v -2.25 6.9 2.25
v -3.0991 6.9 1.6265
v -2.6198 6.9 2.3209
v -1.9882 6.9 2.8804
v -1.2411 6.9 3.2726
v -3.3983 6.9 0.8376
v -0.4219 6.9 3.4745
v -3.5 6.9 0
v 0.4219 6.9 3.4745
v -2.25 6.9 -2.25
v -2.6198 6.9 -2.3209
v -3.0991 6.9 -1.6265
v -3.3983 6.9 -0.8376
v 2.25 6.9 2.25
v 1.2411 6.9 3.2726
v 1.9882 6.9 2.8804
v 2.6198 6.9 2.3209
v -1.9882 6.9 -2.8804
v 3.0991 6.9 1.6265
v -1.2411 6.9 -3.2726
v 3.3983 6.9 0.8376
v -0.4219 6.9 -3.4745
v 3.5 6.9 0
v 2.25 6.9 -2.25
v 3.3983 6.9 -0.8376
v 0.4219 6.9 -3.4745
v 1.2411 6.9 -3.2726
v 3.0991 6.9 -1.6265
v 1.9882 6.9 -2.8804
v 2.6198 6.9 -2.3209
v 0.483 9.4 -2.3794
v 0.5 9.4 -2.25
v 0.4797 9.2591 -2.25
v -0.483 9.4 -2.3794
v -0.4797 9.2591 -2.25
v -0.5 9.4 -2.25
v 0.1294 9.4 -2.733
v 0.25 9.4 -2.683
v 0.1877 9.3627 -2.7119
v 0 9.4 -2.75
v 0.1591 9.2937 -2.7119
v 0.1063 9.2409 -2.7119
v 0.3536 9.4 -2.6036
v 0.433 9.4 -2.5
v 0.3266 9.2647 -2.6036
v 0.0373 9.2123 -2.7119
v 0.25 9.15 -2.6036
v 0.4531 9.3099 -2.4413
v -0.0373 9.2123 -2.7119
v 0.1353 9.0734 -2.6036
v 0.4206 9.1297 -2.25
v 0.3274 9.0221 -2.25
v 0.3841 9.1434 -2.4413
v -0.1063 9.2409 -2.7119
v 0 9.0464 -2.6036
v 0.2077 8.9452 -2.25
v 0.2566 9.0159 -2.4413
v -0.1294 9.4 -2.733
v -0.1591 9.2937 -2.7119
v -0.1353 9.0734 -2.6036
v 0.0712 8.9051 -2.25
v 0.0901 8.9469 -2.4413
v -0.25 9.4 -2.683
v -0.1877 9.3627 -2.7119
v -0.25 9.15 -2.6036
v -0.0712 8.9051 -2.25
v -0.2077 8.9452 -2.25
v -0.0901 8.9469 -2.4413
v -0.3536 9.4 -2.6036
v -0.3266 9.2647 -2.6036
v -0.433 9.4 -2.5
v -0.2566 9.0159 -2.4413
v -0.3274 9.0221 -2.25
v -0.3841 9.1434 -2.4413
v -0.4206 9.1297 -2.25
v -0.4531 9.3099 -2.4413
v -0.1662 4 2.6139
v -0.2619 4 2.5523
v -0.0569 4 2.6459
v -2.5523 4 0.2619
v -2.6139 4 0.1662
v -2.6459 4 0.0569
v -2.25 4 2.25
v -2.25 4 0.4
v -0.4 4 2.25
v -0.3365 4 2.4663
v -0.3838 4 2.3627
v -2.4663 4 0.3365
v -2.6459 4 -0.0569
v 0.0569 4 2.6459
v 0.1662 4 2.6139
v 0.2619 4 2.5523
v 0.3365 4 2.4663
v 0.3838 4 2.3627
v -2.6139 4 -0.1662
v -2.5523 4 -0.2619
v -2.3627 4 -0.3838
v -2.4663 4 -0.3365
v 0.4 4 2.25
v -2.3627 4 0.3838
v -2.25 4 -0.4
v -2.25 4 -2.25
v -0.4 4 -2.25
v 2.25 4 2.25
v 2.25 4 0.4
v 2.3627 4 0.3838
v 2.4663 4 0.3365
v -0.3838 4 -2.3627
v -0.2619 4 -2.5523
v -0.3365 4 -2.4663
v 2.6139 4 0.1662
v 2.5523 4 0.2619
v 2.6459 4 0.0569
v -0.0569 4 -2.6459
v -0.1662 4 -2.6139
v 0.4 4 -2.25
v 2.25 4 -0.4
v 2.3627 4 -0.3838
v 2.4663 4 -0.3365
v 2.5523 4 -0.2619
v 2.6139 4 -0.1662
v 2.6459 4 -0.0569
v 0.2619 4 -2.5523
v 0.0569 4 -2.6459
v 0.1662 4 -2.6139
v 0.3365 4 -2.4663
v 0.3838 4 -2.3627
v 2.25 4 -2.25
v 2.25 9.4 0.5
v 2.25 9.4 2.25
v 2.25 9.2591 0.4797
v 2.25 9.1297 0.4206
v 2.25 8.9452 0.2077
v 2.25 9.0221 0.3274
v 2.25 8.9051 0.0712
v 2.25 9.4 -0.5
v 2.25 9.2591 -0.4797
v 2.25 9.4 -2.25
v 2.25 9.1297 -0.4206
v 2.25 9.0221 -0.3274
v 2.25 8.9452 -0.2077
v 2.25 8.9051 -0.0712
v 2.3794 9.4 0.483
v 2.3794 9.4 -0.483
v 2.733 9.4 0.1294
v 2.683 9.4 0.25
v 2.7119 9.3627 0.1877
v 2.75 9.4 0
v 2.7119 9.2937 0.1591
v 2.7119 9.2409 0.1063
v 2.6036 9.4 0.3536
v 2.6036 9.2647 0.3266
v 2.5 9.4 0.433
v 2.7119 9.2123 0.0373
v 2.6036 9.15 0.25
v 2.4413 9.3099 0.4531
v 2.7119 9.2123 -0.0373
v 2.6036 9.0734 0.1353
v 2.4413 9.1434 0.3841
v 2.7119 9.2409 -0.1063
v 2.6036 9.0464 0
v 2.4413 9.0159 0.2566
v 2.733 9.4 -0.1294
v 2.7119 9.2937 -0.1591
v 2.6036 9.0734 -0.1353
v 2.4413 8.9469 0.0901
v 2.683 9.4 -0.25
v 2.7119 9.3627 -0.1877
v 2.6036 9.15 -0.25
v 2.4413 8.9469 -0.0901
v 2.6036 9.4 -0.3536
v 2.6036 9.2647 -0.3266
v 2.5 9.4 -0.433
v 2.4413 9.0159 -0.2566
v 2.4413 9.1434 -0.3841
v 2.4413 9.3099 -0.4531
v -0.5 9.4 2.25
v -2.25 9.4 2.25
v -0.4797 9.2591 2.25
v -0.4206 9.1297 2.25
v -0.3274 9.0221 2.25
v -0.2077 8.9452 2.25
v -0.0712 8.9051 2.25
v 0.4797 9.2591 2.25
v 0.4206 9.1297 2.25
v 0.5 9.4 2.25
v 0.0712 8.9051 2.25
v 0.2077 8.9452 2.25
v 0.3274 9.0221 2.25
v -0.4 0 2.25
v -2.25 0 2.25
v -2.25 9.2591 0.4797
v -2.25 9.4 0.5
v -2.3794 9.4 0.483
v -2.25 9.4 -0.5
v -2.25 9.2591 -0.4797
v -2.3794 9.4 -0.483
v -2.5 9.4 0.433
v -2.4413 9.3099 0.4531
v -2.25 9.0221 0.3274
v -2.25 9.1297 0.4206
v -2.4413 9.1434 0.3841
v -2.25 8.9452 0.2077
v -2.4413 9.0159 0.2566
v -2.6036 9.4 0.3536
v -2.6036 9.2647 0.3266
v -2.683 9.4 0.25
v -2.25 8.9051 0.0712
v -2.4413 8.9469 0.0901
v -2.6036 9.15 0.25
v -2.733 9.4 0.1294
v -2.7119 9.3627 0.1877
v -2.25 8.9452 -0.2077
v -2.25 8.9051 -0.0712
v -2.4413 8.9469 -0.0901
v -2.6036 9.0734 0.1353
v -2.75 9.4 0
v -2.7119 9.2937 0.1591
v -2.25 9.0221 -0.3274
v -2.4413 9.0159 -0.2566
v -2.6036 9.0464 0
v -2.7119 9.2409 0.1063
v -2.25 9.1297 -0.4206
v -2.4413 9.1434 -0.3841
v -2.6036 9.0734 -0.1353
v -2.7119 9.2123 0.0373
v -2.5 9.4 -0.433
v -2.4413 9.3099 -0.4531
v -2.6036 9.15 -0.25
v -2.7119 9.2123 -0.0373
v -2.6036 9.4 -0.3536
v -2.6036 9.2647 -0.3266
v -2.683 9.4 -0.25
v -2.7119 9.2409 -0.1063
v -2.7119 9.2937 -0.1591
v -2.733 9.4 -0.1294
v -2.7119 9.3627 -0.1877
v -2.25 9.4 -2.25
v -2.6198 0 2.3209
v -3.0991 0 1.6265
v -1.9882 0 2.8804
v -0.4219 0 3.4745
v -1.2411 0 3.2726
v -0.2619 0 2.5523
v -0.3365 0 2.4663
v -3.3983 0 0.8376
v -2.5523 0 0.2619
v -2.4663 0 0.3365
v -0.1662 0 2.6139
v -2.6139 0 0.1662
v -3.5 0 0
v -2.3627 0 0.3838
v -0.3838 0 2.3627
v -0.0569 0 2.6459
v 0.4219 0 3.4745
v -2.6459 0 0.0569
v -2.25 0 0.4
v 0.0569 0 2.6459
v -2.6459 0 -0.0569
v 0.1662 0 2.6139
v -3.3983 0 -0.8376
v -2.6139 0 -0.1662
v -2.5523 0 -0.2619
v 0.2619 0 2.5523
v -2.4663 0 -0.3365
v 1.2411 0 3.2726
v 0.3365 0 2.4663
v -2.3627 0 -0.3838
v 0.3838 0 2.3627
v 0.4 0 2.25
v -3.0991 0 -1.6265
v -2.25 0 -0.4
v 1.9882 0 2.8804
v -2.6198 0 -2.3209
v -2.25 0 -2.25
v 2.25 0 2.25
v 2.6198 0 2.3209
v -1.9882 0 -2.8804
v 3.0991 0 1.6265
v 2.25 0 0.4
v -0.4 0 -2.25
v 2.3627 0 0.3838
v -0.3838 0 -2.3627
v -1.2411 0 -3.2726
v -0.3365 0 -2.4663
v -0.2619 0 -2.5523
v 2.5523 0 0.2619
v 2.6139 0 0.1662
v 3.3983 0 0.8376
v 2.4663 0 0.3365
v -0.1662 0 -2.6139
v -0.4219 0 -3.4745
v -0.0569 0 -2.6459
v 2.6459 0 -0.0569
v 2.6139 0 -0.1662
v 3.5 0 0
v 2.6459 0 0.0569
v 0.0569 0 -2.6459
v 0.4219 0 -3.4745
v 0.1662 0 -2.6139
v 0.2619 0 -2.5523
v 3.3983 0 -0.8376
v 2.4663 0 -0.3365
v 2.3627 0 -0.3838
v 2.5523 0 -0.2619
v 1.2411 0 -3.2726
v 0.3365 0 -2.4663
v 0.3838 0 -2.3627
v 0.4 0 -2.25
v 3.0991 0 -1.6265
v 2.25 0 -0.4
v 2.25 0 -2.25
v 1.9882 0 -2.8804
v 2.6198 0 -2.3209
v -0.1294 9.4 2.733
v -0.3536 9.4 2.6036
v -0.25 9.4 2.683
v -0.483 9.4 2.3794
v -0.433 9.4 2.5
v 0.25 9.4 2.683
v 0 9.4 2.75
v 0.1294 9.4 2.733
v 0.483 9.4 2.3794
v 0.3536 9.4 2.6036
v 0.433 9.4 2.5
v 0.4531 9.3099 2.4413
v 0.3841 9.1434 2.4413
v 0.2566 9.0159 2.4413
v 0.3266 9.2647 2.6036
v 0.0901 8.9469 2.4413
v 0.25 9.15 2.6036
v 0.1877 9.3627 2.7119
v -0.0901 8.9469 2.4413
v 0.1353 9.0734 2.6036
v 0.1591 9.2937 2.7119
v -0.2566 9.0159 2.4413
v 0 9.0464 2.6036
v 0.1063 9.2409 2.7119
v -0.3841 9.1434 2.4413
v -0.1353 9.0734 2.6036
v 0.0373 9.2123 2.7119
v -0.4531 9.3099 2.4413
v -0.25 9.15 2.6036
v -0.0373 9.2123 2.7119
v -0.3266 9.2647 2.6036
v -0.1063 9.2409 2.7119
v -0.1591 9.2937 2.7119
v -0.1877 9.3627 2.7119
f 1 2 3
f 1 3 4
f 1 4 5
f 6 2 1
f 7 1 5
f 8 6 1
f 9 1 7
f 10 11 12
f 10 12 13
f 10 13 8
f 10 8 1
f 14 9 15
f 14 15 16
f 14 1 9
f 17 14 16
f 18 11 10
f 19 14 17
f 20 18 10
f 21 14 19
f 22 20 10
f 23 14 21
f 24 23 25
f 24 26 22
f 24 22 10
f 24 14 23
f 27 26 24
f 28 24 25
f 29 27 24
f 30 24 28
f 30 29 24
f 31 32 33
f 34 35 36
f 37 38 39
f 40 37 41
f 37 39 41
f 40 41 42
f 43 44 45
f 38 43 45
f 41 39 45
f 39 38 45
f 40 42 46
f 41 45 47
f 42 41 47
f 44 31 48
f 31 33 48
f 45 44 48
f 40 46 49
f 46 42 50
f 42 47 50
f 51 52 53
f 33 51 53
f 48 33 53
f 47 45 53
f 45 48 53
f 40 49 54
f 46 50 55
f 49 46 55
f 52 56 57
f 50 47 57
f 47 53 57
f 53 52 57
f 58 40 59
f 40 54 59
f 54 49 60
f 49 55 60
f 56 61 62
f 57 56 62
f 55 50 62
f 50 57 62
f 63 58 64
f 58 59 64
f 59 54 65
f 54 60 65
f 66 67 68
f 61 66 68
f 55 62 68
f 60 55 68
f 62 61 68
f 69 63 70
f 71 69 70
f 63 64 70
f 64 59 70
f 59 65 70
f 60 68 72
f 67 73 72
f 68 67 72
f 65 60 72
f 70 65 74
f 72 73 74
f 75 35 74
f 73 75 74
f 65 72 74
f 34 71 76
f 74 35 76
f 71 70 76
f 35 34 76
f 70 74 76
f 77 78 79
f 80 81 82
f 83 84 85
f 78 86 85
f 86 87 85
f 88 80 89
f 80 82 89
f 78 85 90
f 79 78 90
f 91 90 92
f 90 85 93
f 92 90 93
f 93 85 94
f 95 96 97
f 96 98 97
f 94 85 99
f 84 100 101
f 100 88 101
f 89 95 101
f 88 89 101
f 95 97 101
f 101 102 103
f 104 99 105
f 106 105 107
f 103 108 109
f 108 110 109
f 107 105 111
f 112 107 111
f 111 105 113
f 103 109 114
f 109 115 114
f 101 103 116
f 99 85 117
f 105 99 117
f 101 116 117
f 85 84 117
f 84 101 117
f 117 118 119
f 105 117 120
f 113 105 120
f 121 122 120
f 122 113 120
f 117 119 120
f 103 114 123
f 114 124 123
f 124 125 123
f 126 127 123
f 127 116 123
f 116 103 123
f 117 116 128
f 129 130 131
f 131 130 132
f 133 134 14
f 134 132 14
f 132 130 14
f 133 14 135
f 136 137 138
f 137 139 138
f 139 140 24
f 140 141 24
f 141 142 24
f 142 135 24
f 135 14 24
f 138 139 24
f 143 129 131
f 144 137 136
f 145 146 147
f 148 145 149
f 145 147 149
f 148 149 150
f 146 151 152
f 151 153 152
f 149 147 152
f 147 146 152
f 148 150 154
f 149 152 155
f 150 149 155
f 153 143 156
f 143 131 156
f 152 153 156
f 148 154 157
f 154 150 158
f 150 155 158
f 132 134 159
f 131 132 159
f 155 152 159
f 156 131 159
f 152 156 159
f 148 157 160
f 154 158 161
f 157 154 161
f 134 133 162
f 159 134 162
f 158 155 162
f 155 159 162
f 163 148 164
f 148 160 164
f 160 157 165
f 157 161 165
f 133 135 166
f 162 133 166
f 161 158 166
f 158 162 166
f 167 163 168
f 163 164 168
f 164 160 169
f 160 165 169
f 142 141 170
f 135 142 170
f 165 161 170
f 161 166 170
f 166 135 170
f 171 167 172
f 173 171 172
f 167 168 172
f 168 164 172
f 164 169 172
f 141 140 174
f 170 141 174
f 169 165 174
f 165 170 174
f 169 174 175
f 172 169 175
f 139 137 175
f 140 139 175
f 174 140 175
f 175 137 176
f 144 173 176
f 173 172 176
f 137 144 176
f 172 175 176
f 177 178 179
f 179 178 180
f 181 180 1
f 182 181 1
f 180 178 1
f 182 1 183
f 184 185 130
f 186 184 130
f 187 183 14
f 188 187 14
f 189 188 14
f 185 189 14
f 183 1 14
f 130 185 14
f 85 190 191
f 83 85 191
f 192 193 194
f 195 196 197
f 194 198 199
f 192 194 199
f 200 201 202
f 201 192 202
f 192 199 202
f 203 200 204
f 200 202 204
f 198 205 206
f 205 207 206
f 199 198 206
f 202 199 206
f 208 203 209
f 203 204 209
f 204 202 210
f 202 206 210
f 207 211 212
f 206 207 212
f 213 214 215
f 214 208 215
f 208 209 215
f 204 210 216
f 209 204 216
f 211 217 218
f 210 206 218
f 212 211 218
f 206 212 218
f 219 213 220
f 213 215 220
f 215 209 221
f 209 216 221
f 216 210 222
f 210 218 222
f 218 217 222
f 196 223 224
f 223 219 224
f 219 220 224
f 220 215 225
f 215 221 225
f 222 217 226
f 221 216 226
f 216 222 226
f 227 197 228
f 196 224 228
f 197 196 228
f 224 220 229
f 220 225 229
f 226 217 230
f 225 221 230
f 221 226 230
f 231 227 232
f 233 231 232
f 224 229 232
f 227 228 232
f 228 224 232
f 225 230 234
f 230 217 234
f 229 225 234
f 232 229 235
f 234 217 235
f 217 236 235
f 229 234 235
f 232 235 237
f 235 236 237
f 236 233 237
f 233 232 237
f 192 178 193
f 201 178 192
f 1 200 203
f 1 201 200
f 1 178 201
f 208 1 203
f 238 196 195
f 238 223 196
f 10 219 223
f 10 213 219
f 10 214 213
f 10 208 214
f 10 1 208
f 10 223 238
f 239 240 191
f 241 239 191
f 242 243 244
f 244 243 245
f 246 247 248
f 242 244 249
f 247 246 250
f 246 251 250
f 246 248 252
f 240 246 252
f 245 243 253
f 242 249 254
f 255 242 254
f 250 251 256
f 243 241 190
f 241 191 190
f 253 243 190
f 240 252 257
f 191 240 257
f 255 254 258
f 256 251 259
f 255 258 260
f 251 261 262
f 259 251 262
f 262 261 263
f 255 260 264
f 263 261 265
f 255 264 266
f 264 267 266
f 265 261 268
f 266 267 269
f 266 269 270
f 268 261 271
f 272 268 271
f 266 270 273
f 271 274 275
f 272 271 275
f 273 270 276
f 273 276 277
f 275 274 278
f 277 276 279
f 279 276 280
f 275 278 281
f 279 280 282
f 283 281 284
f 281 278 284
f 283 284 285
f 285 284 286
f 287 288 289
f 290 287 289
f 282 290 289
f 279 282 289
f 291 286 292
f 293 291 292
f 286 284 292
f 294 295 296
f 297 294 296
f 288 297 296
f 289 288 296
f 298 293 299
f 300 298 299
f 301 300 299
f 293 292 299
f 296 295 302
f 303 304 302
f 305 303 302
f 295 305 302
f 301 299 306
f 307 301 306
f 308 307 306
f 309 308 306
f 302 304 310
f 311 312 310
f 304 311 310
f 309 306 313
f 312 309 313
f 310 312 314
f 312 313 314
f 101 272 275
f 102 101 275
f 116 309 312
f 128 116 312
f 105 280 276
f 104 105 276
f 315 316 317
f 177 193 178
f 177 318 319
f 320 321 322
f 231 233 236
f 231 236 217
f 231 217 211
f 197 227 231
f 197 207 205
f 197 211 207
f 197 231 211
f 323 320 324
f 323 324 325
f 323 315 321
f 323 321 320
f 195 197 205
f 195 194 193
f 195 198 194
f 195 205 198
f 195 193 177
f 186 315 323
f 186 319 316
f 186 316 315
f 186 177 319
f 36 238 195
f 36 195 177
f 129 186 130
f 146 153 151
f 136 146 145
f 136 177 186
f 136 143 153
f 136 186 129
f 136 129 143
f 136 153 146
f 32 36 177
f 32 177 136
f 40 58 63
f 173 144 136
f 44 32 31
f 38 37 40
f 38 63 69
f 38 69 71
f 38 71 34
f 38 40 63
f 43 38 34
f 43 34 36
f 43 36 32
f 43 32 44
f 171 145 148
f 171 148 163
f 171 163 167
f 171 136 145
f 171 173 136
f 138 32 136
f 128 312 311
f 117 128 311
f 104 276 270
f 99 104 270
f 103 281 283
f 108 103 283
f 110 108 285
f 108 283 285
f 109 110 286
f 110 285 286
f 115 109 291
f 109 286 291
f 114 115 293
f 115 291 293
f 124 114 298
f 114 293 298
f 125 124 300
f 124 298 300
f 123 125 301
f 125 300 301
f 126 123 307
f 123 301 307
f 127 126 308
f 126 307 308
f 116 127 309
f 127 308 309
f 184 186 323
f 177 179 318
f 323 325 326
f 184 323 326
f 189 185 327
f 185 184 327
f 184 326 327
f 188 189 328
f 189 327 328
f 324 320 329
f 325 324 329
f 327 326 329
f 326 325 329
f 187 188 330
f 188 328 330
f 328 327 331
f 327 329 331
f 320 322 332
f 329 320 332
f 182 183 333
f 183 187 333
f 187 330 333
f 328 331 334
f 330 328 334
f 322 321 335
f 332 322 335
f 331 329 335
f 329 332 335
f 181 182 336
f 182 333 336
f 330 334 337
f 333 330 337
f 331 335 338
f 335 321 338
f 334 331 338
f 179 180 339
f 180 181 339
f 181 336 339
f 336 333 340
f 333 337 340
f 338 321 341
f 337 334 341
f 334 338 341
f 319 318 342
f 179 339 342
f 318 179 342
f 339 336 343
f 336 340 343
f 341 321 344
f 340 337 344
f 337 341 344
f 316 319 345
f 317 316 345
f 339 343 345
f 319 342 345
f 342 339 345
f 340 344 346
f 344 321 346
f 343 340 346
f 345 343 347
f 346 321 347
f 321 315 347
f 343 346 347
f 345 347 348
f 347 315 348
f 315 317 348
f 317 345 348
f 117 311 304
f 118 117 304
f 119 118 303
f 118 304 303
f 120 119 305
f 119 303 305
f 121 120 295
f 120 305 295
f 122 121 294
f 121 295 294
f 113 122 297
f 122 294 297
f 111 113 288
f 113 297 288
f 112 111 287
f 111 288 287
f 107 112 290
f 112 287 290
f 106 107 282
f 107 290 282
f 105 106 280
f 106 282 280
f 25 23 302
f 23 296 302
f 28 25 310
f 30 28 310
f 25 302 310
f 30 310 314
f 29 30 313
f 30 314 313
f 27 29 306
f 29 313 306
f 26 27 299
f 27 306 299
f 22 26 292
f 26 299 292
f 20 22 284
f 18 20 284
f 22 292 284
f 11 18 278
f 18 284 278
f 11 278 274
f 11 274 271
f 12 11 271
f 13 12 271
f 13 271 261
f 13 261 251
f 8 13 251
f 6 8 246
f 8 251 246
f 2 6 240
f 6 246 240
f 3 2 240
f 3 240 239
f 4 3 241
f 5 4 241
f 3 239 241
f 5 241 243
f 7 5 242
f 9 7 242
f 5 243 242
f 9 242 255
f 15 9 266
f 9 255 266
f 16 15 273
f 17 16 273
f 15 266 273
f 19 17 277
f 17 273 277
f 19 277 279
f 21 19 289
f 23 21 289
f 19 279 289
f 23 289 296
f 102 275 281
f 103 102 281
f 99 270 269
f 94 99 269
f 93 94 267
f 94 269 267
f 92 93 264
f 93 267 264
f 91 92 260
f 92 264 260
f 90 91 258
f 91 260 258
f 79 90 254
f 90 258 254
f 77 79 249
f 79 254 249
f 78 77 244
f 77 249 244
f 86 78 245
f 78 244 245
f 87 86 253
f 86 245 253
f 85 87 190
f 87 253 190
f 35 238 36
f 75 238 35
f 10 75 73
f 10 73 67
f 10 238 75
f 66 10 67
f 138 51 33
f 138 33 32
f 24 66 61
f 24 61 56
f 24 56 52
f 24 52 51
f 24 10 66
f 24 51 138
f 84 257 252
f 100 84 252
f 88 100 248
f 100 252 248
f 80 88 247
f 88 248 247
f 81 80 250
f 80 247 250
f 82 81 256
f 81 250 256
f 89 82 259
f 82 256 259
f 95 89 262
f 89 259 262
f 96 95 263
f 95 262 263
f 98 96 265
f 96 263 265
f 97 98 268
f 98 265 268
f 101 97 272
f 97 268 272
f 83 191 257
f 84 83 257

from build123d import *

# Parameters (mm, degrees)
SKETCH_1_R          = 3.5
EXTRUDE_1_DEPTH     = 4
SKETCH_3_R          = 3.5
EXTRUDE_2_DEPTH     = 2.9
SKETCH_4_W          = 4.5
SKETCH_4_H          = 4.5
EXTRUDE_3_DEPTH     = 2.5
SKETCH_7_R          = 3.5
CUT_EXTRUDE_1_DEPTH = 10


with BuildPart() as part:
    # 草图1 → 凸台-拉伸1 (new body)
    with BuildSketch(Plane(origin=(0, 0, 0), x_dir=(1, 0, 0), z_dir=(0, 1, 0))):
        Circle(SKETCH_1_R)
        with BuildLine():
            Line((-2.25, 2.25), (-0.4, 2.25))
            ThreePointArc((-0.4, 2.25), (0, 2.65), (0.4, 2.25))
            Line((0.4, 2.25), (2.25, 2.25))
            Line((2.25, 2.25), (2.25, 0.4))
            ThreePointArc((2.25, 0.4), (2.65, 0), (2.25, -0.4))
            Line((2.25, -0.4), (2.25, -2.25))
            Line((2.25, -2.25), (0.4, -2.25))
            ThreePointArc((0.4, -2.25), (0, -2.65), (-0.4, -2.25))
            Line((-0.4, -2.25), (-2.25, -2.25))
            Line((-2.25, -2.25), (-2.25, -0.4))
            ThreePointArc((-2.25, -0.4), (-2.65, 0), (-2.25, 0.4))
            Line((-2.25, 0.4), (-2.25, 2.25))
        make_face(mode=Mode.SUBTRACT)
    extrude(amount=EXTRUDE_1_DEPTH)

    # 草图3 → 凸台-拉伸2 (add)
    with BuildSketch(Plane(origin=(0, 4, 0), x_dir=(1, 0, 0), z_dir=(0, 1, 0))):
        Circle(SKETCH_3_R)
    extrude(amount=EXTRUDE_2_DEPTH)

    # 草图4 → 凸台-拉伸3 (add)
    with BuildSketch(Plane(origin=(0, 6.9, 0), x_dir=(1, 0, 0), z_dir=(0, 1, 0))):
        Rectangle(SKETCH_4_W, SKETCH_4_H)
    extrude(amount=EXTRUDE_3_DEPTH)

    # 草图5 → 旋转1 (revolve)
    with BuildSketch(Plane(origin=(0, 9.4, 0), x_dir=(1, 0, 0), z_dir=(0, 1, 0))):
        with BuildLine():
            Line((-2.75, 0), (-1.75, 0))
            ThreePointArc((-1.75, 0), (-2.25, -0.5), (-2.75, 0))
        make_face()
        with BuildLine():
            Line((1.75, 0), (2.75, 0))
            ThreePointArc((2.75, 0), (2.25, -0.5), (1.75, 0))
        make_face()
    revolve(axis=Axis((-2.75, 9.4, 0), (1, 0, 0)))

    # 草图6 → 旋转2 (revolve)
    with BuildSketch(Plane(origin=(0, 9.4, 0), x_dir=(1, 0, 0), z_dir=(0, 1, 0))):
        with BuildLine():
            Line((0, -2.75), (0, -1.75))
            ThreePointArc((0, -1.75), (-0.5, -2.25), (0, -2.75))
        make_face()
        with BuildLine():
            Line((0, 1.75), (0, 2.75))
            ThreePointArc((0, 2.75), (-0.5, 2.25), (0, 1.75))
        make_face()
    revolve(axis=Axis((0, 9.4, 2.75), (0, 0, -1)))

    # 草图7 → 切除-拉伸1 (cut)
    with BuildSketch(Plane(origin=(0, 9.4, 0), x_dir=(1, 0, 0), z_dir=(0, 1, 0))):
        Circle(SKETCH_7_R)
    extrude(amount=CUT_EXTRUDE_1_DEPTH, mode=Mode.SUBTRACT)


solid = part.part
